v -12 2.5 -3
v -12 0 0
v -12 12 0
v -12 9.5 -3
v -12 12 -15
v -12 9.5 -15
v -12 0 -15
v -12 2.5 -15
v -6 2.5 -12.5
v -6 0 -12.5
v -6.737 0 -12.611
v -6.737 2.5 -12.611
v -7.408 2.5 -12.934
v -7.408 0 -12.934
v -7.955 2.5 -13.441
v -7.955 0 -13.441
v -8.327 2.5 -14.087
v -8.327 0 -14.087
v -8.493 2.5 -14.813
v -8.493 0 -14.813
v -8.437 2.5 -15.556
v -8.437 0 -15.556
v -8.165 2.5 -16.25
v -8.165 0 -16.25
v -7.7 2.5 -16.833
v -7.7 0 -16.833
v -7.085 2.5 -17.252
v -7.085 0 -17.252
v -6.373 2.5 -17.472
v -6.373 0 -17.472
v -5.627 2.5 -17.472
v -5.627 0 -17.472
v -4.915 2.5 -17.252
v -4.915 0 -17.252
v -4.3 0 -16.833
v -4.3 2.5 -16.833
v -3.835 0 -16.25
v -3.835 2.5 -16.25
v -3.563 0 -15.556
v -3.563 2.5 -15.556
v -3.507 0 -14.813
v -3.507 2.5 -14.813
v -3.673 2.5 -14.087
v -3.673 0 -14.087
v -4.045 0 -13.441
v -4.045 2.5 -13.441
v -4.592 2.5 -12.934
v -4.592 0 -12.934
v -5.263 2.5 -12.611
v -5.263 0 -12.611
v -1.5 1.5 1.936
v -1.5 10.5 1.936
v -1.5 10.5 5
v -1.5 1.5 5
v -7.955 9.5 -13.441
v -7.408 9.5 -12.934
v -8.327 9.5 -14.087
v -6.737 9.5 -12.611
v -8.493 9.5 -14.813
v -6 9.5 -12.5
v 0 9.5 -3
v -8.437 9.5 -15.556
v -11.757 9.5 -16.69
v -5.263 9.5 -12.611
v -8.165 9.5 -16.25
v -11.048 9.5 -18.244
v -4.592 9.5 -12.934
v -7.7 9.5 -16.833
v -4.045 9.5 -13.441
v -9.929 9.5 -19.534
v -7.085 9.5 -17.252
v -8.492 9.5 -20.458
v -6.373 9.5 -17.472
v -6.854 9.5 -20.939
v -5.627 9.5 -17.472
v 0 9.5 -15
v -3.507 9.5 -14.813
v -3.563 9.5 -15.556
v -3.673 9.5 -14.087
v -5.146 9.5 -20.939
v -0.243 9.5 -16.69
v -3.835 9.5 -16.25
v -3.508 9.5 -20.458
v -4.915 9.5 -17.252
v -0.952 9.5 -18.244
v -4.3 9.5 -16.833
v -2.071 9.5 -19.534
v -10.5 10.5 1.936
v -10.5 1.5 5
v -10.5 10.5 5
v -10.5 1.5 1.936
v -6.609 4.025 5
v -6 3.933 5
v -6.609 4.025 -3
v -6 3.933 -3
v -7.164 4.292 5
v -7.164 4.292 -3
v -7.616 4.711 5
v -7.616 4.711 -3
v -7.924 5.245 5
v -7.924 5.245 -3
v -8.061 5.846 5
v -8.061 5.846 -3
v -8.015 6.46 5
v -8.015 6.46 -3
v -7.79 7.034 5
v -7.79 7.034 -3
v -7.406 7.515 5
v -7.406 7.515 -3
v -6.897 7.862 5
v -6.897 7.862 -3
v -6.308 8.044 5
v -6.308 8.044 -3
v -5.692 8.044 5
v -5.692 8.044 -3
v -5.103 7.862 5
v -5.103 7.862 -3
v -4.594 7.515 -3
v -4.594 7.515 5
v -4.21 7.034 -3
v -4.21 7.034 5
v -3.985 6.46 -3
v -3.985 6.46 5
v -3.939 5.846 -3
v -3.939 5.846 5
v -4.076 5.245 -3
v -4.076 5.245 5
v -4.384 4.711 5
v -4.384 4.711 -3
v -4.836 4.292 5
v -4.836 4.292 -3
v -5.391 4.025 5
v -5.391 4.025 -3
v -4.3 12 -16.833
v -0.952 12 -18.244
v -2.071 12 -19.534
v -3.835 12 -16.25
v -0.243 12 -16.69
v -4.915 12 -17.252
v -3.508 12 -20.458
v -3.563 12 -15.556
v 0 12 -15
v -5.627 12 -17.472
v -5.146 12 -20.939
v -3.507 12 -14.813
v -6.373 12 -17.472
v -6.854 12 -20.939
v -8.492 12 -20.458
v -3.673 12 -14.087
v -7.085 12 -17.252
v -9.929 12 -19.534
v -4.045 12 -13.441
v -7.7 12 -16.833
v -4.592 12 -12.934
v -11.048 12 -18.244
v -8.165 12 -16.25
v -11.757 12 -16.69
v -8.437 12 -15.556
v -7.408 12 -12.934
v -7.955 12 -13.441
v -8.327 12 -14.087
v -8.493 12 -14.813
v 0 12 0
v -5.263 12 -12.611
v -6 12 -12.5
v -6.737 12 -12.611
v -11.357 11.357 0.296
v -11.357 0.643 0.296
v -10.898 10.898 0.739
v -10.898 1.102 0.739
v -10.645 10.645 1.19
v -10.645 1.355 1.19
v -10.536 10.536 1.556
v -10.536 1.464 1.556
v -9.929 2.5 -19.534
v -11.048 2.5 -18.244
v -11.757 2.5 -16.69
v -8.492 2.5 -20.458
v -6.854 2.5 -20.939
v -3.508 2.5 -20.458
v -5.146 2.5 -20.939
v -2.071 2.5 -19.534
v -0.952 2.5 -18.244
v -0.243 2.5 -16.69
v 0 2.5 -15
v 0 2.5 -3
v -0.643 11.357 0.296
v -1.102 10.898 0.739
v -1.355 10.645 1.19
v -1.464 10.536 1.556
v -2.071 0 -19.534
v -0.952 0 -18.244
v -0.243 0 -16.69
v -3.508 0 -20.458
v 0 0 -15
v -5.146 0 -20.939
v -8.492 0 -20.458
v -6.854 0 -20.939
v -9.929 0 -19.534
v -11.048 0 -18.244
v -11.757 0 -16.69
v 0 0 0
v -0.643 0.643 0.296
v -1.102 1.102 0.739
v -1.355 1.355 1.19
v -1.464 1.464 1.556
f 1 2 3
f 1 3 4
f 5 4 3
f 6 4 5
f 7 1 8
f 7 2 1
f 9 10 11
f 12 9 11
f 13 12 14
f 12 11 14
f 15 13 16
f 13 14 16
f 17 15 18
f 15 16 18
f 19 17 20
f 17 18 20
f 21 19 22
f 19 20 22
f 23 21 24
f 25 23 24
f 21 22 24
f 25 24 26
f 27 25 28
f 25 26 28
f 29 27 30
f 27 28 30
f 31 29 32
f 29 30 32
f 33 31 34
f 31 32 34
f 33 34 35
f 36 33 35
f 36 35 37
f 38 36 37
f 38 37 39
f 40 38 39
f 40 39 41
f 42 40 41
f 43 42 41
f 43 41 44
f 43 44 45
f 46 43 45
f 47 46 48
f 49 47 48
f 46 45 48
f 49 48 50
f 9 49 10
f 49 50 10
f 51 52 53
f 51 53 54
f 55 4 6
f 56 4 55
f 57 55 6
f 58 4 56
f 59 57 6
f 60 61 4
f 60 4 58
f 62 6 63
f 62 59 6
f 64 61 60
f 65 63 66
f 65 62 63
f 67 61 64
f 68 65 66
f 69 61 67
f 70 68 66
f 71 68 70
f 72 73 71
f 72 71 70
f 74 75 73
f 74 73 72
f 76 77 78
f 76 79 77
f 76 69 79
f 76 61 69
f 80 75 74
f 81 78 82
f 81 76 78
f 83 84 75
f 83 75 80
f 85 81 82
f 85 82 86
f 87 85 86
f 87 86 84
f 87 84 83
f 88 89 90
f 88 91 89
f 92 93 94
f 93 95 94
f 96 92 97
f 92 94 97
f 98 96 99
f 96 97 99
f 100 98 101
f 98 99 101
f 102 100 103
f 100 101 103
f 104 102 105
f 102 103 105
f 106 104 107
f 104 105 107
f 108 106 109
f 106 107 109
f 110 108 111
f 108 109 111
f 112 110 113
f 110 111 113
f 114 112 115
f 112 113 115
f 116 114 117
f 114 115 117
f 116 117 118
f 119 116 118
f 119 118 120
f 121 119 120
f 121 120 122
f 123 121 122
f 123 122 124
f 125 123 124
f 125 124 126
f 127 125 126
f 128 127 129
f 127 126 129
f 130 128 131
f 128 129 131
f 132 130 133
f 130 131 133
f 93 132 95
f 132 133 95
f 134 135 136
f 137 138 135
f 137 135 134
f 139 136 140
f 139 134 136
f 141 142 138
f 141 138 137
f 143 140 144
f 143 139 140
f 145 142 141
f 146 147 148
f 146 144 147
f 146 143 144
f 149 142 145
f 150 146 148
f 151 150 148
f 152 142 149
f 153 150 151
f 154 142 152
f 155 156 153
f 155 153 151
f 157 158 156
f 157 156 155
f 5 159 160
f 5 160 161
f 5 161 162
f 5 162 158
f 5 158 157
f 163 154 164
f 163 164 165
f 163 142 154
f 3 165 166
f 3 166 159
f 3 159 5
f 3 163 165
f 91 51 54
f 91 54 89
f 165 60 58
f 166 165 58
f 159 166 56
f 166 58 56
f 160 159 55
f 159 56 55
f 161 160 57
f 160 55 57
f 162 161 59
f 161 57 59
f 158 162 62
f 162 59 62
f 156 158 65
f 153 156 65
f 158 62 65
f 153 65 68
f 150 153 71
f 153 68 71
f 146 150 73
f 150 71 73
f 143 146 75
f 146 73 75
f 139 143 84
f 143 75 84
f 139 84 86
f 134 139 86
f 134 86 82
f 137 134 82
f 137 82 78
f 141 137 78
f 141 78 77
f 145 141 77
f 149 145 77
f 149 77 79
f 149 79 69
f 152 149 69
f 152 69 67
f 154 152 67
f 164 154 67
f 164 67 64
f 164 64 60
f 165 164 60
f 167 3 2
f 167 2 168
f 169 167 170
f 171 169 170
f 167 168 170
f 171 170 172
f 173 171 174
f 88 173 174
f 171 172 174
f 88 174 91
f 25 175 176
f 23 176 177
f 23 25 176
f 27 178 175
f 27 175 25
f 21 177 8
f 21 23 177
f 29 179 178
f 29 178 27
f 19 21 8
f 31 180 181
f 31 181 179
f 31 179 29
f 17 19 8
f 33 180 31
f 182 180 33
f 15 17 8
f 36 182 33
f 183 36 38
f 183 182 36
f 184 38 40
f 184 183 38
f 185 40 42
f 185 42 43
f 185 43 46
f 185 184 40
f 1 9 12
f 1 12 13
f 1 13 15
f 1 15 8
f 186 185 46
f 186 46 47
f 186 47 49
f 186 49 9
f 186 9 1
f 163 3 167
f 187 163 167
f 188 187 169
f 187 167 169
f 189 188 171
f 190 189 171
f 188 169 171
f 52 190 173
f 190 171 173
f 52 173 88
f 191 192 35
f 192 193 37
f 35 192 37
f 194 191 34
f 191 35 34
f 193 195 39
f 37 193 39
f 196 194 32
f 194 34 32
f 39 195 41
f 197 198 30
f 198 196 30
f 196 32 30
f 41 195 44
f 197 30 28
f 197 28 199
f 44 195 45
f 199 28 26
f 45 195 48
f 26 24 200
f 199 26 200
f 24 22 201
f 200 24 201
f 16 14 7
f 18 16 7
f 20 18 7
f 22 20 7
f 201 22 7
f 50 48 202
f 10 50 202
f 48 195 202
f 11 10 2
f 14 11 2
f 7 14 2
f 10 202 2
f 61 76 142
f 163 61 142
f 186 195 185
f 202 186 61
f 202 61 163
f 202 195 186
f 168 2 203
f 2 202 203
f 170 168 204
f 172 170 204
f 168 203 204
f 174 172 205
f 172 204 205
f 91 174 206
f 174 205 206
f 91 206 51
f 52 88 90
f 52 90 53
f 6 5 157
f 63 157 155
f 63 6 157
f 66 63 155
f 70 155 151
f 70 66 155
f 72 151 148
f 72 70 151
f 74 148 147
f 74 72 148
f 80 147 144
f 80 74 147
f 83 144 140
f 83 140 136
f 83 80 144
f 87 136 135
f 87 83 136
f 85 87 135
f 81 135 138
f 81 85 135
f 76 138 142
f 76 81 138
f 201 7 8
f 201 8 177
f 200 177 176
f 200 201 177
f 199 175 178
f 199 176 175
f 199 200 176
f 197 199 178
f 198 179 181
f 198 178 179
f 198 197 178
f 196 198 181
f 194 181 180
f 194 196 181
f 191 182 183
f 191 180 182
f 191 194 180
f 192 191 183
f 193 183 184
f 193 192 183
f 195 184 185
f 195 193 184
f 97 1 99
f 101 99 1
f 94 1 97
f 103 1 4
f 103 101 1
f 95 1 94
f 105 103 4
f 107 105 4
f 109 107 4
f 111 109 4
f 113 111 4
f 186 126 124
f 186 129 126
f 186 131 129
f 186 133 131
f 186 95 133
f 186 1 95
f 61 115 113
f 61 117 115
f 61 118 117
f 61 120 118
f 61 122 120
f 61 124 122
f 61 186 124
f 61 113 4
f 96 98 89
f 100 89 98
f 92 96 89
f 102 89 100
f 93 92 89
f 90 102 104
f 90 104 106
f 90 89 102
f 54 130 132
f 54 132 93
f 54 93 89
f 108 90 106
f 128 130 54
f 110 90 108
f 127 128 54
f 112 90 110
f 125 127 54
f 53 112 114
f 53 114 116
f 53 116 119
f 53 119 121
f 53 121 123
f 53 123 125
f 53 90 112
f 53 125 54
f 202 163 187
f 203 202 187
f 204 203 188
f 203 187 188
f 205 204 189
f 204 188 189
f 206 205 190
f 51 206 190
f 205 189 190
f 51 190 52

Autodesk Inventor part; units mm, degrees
ref_plane "YZ Plane" through (0, 0, 0) normal (1, 0, 0) x (0, 1, 0)
ref_plane "XZ Plane" through (0, 0, 0) normal (0, 1, 0) x (-1, 0, 0)
ref_plane "XY Plane" through (0, 0, 0) normal (0, 0, 1) x (1, 0, 0)
sketch "Sketch1" plane through (0, 0, 0) normal (0, 1, 0) x (-1, 0, 0)
  line L0 (0, 0) -> (12, 0)
  line L1 (12, 0) -> (12, -15)
  line L2 (12, -15) -> (0, -15)
  line L3 (0, -15) -> (0, 0)
  dimension "d0" = 12
  dimension "d1" = 15
extrude "Extrusion1" add sketch "Sketch1" along normal blind 12
sketch "Sketch4" plane through (0, 0, 0) normal (0, -1, 0) x (1, 0, 0)
  line L0 (0, -15) -> (-12, -15) projected
  arc A0 (-12, -15) -> (0, -15) centre (-6, -15) ccw
  point P0 (0, 0)
  point P1 (-6, -15)
extrude "Extrusion2" add sketch "Sketch4" against normal up to surface (12 mm away)
sketch "Sketch5" plane through (0, 0, 0) normal (1, 0, 0) x (0, 0, -1)
  line L0 (3, 9.5) -> (21, 9.5)
  line L1 (21, 9.5) -> (21, 2.5)
  line L2 (21, 2.5) -> (3, 2.5)
  line L3 (3, 2.5) -> (3, 9.5)
  line L4 (15, 12) -> (15, 12) projected
  line L5 (15, 0) -> (15, 12) projected
  line L6 (15, 0) -> (15, 0) projected
  line L7 (15, 0) -> (15, 12) projected
  line L8 (21, 0) -> (21, 12) projected
  line L9 (0, 0) -> (0, 12) projected
  point P0 (21, 6)
  point P1 (3, 6)
  point P2 (0, 6)
  dimension "d8" = 18
  dimension "d9" = 7
extrude "Extrusion3" cut sketch "Sketch5" against normal up to surface (12 mm away)
sketch "Sketch6" plane through (0, 12, 0) normal (0, 1, 0) x (1, 0, 0)
  arc A0 (0, 15) -> (-12, 15) centre (-6, 15) ccw projected
  point P0 (0, 0)
hole "Hole1" at (-6, 12, -15) direction (0, -1, 0) diameter 5 depth 12
sketch "Sketch7" plane through (-12, 0, 0) normal (0, 0, 1) x (1, 0, 0)
  line L0 (10.5, 1.5) -> (1.5, 1.5)
  line L1 (1.5, 1.5) -> (1.5, 10.5)
  line L2 (1.5, 10.5) -> (10.5, 10.5)
  line L3 (10.5, 10.5) -> (10.5, 1.5)
  line L4 (0, 0) -> (0, 12) projected
  line L5 (0, 0) -> (12, 0) projected
  point P0 (1.5, 6)
  point P1 (0, 6)
  point P2 (6, 1.5)
  point P3 (6, 0)
  dimension "d19" = 9
  dimension "d20" = 9
extrude "Extrusion4" add sketch "Sketch7" along normal blind 5
fillet "Fillet1" radius 2 4 edges at (-6, 1.5, 0) (-10.5, 6, 0) (-6, 10.5, 0) (-1.5, 6, 0)
sketch "Sketch8" plane through (-12, 0, 5) normal (0, 0, 1) x (1, 0, 0)
  line L0 (10.5, 1.5) -> (10.5, 10.5) projected
  line L1 (1.5, 1.5) -> (10.5, 1.5) projected
  point P0 (12, 0)
  point P1 (6, 6)
  point P2 (10.5, 6)
  point P3 (6, 1.5)
hole "Hole2" at (-6, 6, 5) direction (0, 0, -1) diameter 4.134 depth 8 thread size "M5x0.8" class "6H" standard "ISO Metric profile"
properties part number "2063"
